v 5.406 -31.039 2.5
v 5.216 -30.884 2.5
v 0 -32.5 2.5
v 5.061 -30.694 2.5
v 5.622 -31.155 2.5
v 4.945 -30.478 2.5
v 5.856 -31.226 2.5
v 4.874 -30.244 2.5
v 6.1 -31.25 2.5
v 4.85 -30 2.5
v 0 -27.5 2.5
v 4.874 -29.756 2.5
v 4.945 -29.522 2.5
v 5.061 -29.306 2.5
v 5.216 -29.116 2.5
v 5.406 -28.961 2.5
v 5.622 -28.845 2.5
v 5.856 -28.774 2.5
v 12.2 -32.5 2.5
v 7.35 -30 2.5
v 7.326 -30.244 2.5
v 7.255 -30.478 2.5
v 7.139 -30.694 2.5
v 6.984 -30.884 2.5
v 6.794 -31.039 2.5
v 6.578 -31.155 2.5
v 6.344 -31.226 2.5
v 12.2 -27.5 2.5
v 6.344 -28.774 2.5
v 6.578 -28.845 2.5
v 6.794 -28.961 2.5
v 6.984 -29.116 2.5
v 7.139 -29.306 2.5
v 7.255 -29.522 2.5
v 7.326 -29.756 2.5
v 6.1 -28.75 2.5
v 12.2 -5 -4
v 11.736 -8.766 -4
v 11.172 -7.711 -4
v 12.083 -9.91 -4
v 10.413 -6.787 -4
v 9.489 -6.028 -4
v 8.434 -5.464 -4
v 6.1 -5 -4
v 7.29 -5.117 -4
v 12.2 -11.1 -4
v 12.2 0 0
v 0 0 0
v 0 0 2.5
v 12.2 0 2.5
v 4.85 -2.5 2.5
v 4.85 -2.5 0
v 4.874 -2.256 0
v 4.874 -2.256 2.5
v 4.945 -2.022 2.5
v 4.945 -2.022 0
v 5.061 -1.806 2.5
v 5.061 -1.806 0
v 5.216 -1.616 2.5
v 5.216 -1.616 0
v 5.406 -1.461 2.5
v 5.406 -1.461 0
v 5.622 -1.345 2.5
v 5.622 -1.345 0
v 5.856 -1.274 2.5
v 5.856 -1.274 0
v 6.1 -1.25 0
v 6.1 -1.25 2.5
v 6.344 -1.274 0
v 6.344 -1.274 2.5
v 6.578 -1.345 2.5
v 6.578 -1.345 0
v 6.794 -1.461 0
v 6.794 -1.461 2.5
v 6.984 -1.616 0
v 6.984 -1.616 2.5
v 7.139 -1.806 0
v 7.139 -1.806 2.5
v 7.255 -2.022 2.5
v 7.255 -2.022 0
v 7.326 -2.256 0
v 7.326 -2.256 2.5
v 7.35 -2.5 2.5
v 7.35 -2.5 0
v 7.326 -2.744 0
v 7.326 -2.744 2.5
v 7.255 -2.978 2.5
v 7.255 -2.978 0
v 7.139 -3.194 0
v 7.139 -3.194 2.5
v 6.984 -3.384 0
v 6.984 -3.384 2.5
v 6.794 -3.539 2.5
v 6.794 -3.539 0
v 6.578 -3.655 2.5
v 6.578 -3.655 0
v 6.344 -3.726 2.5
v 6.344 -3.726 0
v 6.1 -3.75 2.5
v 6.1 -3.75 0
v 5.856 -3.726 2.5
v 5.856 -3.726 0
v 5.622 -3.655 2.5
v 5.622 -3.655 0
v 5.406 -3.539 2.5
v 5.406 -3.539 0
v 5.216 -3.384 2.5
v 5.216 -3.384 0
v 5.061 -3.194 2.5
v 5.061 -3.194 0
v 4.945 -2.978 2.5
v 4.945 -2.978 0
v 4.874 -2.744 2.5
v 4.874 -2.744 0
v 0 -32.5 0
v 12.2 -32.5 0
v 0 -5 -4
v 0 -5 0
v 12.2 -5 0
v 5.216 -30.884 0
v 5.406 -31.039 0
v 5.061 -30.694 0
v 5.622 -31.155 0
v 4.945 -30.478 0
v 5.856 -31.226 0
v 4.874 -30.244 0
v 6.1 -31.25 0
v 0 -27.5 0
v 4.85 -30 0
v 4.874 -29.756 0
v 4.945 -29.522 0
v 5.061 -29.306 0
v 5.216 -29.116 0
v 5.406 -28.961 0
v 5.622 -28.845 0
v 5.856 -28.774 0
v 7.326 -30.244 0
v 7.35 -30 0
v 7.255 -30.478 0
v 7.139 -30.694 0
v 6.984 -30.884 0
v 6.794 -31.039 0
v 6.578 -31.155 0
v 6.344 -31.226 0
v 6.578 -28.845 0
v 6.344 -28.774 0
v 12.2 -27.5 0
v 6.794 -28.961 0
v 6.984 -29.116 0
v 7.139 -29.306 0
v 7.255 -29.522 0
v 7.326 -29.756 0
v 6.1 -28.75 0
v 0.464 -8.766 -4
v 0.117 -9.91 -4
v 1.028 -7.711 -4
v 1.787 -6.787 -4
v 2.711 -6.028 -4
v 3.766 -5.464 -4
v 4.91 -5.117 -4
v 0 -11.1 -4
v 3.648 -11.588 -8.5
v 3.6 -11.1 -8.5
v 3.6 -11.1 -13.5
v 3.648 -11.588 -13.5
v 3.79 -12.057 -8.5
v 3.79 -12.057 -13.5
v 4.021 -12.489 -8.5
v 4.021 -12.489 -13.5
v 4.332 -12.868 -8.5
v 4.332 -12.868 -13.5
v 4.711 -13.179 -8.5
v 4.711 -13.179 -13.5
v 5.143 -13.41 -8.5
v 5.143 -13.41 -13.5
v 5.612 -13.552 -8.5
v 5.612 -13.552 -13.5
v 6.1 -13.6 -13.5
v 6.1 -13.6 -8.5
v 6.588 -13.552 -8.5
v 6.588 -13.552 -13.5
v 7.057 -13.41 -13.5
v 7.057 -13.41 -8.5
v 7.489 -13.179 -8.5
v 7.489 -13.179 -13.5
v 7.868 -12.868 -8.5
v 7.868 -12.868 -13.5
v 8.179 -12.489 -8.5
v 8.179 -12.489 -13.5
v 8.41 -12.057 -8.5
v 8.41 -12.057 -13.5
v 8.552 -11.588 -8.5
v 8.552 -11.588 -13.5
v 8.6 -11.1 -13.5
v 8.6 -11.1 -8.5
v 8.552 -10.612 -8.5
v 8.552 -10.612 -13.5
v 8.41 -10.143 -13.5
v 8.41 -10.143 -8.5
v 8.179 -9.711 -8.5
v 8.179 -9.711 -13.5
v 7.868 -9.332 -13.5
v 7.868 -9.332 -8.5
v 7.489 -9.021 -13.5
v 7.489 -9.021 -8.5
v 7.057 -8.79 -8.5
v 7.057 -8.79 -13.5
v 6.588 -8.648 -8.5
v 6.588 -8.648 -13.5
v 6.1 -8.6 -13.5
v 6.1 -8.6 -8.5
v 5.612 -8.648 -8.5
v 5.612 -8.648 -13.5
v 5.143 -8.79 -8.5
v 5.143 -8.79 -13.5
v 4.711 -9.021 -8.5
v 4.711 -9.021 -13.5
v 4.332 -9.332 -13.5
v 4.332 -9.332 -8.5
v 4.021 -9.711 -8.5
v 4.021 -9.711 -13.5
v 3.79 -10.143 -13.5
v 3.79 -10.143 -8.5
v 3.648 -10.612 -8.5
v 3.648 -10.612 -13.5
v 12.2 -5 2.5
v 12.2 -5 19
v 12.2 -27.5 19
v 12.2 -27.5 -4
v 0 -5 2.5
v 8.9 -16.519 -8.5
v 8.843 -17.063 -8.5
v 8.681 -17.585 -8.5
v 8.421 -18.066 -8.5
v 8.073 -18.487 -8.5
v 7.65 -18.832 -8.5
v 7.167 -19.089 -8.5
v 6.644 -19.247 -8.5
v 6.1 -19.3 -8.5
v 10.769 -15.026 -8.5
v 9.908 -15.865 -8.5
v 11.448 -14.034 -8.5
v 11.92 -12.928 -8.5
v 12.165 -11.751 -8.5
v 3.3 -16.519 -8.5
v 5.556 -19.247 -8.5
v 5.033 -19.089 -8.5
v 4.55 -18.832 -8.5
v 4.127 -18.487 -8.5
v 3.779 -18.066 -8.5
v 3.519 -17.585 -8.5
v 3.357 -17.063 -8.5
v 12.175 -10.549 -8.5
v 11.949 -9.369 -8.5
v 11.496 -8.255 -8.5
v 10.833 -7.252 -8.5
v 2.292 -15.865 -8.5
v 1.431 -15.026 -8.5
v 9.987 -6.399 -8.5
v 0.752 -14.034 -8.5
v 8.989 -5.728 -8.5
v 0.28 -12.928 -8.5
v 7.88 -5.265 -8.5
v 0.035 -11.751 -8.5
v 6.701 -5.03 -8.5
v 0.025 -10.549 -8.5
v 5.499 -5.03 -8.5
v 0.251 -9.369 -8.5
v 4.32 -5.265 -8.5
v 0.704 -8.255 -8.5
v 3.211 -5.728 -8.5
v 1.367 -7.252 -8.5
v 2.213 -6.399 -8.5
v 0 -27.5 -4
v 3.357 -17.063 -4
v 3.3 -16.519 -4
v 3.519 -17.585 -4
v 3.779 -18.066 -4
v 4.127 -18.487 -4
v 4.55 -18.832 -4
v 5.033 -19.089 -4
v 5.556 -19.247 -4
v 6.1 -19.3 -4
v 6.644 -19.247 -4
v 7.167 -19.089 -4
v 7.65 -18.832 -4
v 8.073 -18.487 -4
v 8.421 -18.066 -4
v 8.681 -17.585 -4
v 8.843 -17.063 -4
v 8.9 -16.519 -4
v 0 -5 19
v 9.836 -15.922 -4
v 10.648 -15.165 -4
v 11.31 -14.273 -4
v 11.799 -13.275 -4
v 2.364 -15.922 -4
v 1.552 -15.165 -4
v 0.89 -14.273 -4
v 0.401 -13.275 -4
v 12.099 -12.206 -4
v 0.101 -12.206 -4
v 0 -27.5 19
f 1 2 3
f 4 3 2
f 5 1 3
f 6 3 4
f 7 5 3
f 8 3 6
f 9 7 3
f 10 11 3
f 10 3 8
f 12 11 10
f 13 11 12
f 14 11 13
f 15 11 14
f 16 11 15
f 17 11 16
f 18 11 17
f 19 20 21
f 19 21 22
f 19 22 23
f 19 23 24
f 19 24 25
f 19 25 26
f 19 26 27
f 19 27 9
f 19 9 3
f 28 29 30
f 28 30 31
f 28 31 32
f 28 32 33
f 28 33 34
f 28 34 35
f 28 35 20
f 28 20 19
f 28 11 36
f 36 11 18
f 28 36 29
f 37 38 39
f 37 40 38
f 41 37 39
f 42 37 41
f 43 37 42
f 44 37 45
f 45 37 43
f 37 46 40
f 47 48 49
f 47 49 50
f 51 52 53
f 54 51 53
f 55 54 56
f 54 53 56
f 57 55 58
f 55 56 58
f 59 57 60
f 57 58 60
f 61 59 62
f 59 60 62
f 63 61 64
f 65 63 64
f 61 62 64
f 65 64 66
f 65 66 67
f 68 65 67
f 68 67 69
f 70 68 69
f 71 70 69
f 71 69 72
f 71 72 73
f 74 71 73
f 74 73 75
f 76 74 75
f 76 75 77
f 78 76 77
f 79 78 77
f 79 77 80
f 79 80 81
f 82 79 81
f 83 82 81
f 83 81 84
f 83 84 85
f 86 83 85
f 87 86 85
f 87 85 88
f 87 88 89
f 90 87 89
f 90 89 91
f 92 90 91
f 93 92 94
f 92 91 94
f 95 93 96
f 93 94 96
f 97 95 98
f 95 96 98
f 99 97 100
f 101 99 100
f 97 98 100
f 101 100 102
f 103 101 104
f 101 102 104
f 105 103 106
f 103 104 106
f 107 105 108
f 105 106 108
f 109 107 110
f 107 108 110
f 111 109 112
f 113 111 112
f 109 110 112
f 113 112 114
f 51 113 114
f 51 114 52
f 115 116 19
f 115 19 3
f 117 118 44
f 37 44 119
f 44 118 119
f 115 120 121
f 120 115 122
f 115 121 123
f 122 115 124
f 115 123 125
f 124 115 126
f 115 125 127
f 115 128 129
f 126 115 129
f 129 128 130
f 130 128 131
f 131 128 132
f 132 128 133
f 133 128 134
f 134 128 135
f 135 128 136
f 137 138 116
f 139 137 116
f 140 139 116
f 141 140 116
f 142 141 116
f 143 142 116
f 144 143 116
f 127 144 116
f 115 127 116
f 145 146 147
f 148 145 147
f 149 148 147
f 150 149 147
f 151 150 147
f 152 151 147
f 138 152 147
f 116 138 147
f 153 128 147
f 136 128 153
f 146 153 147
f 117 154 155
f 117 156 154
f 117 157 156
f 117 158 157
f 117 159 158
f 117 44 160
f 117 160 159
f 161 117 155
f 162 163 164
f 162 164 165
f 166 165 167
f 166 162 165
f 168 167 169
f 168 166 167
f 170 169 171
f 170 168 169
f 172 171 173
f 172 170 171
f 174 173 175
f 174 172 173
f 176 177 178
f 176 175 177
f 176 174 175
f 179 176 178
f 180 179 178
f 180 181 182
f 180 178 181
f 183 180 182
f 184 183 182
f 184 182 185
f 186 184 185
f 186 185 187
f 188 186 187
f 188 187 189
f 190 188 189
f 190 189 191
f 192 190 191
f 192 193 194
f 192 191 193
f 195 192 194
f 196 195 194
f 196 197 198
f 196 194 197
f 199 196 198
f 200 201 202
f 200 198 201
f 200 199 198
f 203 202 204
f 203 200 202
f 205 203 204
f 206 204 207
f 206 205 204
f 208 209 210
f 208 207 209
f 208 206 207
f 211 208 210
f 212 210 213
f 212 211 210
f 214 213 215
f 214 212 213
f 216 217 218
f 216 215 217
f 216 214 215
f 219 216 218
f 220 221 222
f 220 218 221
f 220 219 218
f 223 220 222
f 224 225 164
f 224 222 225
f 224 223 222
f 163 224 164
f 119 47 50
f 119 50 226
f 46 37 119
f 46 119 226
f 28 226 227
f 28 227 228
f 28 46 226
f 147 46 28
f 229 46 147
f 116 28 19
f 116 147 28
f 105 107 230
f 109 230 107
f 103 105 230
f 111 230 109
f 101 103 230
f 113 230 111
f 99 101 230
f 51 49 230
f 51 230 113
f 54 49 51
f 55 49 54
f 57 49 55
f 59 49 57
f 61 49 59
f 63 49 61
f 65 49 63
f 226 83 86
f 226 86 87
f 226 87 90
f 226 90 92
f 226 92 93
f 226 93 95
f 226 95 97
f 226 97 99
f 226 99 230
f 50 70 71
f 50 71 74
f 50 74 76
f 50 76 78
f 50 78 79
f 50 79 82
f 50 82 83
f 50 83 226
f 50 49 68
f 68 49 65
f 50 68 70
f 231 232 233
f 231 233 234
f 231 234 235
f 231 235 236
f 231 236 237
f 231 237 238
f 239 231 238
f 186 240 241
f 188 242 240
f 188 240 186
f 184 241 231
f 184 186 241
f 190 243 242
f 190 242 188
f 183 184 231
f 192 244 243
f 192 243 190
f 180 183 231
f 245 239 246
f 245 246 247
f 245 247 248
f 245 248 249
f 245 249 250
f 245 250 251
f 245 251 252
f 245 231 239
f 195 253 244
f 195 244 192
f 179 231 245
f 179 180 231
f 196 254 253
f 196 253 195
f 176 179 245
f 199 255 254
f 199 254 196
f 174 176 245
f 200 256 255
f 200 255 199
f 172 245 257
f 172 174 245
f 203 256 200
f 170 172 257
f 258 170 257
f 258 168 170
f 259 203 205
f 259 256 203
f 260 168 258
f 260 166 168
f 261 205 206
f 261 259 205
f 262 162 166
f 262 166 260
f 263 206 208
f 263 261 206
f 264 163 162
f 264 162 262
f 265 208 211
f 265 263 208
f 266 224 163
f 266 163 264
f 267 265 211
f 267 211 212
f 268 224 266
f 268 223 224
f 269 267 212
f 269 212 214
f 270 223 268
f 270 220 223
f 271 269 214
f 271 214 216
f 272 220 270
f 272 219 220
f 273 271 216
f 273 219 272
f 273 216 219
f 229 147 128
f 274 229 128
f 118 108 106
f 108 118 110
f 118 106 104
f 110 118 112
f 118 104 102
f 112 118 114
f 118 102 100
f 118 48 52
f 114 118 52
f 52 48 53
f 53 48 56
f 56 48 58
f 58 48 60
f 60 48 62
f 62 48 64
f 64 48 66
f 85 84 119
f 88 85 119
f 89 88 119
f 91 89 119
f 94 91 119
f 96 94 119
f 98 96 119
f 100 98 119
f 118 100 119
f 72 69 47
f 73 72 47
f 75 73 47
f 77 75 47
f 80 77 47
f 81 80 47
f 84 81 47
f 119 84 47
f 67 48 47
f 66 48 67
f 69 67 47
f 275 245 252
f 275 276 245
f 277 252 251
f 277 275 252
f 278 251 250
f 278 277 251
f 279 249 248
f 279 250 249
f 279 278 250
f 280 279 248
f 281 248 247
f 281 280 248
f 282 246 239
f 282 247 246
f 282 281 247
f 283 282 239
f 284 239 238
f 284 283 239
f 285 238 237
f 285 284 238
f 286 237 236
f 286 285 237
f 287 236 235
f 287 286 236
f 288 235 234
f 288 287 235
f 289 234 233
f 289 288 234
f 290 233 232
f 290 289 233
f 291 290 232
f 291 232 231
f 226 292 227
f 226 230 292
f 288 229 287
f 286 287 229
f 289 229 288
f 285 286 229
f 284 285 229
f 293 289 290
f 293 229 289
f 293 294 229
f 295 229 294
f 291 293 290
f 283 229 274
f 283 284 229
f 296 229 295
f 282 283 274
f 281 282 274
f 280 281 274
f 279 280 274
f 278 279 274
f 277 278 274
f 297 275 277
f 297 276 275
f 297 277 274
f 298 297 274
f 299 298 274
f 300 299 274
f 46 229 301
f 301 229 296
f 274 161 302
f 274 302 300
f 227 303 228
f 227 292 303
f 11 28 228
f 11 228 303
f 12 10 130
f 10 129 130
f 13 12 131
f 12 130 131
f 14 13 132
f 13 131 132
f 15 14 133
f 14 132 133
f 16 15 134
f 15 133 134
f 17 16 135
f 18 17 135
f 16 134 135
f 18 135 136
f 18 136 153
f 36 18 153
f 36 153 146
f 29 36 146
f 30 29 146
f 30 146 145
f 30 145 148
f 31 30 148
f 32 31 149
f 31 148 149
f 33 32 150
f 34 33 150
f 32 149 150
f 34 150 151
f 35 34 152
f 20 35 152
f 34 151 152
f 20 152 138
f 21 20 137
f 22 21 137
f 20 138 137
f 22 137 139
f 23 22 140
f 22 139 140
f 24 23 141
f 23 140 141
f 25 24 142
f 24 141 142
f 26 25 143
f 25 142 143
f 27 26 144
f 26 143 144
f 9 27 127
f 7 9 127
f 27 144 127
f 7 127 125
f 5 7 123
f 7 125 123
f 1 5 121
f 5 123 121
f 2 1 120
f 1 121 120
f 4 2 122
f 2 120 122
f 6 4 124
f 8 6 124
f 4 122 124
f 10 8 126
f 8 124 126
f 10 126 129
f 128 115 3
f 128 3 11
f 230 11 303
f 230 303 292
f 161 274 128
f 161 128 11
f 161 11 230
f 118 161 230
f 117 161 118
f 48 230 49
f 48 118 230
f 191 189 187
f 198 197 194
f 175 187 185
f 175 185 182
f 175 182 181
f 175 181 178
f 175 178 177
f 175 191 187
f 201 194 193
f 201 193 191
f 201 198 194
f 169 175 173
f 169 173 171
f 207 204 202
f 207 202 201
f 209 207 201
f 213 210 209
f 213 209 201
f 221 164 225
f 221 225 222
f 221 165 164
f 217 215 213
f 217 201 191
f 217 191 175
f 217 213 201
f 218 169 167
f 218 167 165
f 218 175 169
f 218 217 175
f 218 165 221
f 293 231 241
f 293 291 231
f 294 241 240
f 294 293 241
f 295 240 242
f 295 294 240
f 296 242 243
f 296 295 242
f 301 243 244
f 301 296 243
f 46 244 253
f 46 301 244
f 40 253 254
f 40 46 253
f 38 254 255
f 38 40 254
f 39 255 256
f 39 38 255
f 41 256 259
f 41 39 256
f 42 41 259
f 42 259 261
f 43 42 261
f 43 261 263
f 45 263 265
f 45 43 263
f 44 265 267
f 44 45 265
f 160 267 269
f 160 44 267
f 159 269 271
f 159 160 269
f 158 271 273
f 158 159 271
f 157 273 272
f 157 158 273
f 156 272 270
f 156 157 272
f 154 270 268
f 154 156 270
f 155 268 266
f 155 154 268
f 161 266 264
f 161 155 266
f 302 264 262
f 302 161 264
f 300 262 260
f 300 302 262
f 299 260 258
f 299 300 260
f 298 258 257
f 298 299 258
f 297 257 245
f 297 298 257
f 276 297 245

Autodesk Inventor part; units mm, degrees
ref_plane "YZ Plane" through (0, 0, 0) normal (1, 0, 0) x (0, 1, 0)
ref_plane "XZ Plane" through (0, 0, 0) normal (0, 1, 0) x (-1, 0, 0)
ref_plane "XY Plane" through (0, 0, 0) normal (0, 0, 1) x (1, 0, 0)
sketch "Sketch3" plane through (0, 0, 0) normal (0, 0, 1) x (1, 0, 0)
  line L0 (0, 0) -> (12.2, 0)
  line L1 (12.2, 0) -> (12.2, -32.5)
  line L2 (12.2, -32.5) -> (0, -32.5)
  line L3 (0, -32.5) -> (0, 0)
  dimension "d11" = 12.2
  dimension "d12" = 32.5
extrude "Extrusion3" add sketch "Sketch3" along normal blind 2.5
sketch "Sketch4" plane through (0, 0, 2.5) normal (0, 0, 1) x (1, 0, 0)
  line L0 (0, 0) -> (0, -32.5) projected
  line L1 (12.2, -32.5) -> (12.2, 0) projected
  line L2 (0, -5) -> (12.2, -5)
  line L3 (12.2, -5) -> (12.2, -27.5)
  line L4 (12.2, -27.5) -> (0, -27.5)
  line L5 (0, -27.5) -> (0, -5)
  line L6 (12.2, 0) -> (0, 0) projected
  dimension "d15" = 22.5
  dimension "d16" = 5
extrude "Extrusion4" add sketch "Sketch4" along normal blind 16.5 contours L2 L1 L4 L0
sketch "Sketch5" plane through (0, 0, 0) normal (0, 0, -1) x (-1, 0, 0)
  line L0 (0, -5) -> (-12.2, -5) projected
  line L1 (-12.2, -27.5) -> (0, -27.5) projected
  line L2 (-12.2, -5) -> (0, -5)
  line L3 (0, -5) -> (0, -27.5)
  line L4 (0, -27.5) -> (-12.2, -27.5)
  line L5 (-12.2, -27.5) -> (-12.2, -5)
  point P0 (0, 0)
extrude "Extrusion5" add sketch "Sketch5" along normal blind 4
sketch "Sketch6" plane through (0, 0, 0) normal (0, 0, -1) x (-1, 0, 0)
  circle A0 centre (-6.1, -2.5) radius 1.25
  circle A1 centre (-6.1, -30) radius 1.25
  line L0 (-12.2, -27.5) -> (0, -27.5) projected
  line L1 (-12.2, 0) -> (0, 0) projected
  line L2 (-12.2, -5) -> (-12.2, 0) projected
  line L3 (-12.2, -32.5) -> (-12.2, -27.5) projected
  dimension "d21" = 2.5
  dimension "d22" = 2.5
  dimension "d23" = 2.5
  dimension "d24" = 2.5
  dimension "d25" = 6.1
  dimension "d26" = 6.1
extrude "Extrusion6" cut sketch "Sketch6" against normal up to surface (2.5 mm away)
sketch "Sketch7" plane through (0, 0, -4) normal (0, 0, -1) x (-1, 0, 0)
  circle A0 centre (-6.1, -11.1) radius 6.1
  line L0 (0, -5) -> (0, -27.5) projected
  line L1 (0, -5) -> (-12.2, -5) projected
  circle A1 centre (-6.1, -16.5) radius 2.8
  line L2 (-12.2, -27.5) -> (0, -27.5) projected
  point P0 (0, 0)
  point P1 (-3.3001, -16.5194)
  point P2 (-8.8999, -16.5194)
  point P3 (-6.1, -5)
  point P4 (0, -11.1)
  dimension "d29" = 6.1
  dimension "d30" = 12.2
  dimension "d33" = 5.6
  dimension "d34" = 11
extrude "Extrusion7" add sketch "Sketch7" along normal blind 4.5 contours A0 A1 | A1 A0 | A0 A1
sketch "Sketch8" plane through (0, 0, -8.5) normal (0, 0, -1) x (-1, 0, 0)
  arc A0 (-6.1, -5) -> (-12.2, -11.1) centre (-6.1, -11.1) ccw projected
  circle A1 centre (-6.1, -11.1) radius 2.5
  point P0 (0, 0)
  dimension "d35" = 5
extrude "Extrusion8" add sketch "Sketch8" along normal blind 5
properties part number "servo_motor" material "Nylon 6/6"
